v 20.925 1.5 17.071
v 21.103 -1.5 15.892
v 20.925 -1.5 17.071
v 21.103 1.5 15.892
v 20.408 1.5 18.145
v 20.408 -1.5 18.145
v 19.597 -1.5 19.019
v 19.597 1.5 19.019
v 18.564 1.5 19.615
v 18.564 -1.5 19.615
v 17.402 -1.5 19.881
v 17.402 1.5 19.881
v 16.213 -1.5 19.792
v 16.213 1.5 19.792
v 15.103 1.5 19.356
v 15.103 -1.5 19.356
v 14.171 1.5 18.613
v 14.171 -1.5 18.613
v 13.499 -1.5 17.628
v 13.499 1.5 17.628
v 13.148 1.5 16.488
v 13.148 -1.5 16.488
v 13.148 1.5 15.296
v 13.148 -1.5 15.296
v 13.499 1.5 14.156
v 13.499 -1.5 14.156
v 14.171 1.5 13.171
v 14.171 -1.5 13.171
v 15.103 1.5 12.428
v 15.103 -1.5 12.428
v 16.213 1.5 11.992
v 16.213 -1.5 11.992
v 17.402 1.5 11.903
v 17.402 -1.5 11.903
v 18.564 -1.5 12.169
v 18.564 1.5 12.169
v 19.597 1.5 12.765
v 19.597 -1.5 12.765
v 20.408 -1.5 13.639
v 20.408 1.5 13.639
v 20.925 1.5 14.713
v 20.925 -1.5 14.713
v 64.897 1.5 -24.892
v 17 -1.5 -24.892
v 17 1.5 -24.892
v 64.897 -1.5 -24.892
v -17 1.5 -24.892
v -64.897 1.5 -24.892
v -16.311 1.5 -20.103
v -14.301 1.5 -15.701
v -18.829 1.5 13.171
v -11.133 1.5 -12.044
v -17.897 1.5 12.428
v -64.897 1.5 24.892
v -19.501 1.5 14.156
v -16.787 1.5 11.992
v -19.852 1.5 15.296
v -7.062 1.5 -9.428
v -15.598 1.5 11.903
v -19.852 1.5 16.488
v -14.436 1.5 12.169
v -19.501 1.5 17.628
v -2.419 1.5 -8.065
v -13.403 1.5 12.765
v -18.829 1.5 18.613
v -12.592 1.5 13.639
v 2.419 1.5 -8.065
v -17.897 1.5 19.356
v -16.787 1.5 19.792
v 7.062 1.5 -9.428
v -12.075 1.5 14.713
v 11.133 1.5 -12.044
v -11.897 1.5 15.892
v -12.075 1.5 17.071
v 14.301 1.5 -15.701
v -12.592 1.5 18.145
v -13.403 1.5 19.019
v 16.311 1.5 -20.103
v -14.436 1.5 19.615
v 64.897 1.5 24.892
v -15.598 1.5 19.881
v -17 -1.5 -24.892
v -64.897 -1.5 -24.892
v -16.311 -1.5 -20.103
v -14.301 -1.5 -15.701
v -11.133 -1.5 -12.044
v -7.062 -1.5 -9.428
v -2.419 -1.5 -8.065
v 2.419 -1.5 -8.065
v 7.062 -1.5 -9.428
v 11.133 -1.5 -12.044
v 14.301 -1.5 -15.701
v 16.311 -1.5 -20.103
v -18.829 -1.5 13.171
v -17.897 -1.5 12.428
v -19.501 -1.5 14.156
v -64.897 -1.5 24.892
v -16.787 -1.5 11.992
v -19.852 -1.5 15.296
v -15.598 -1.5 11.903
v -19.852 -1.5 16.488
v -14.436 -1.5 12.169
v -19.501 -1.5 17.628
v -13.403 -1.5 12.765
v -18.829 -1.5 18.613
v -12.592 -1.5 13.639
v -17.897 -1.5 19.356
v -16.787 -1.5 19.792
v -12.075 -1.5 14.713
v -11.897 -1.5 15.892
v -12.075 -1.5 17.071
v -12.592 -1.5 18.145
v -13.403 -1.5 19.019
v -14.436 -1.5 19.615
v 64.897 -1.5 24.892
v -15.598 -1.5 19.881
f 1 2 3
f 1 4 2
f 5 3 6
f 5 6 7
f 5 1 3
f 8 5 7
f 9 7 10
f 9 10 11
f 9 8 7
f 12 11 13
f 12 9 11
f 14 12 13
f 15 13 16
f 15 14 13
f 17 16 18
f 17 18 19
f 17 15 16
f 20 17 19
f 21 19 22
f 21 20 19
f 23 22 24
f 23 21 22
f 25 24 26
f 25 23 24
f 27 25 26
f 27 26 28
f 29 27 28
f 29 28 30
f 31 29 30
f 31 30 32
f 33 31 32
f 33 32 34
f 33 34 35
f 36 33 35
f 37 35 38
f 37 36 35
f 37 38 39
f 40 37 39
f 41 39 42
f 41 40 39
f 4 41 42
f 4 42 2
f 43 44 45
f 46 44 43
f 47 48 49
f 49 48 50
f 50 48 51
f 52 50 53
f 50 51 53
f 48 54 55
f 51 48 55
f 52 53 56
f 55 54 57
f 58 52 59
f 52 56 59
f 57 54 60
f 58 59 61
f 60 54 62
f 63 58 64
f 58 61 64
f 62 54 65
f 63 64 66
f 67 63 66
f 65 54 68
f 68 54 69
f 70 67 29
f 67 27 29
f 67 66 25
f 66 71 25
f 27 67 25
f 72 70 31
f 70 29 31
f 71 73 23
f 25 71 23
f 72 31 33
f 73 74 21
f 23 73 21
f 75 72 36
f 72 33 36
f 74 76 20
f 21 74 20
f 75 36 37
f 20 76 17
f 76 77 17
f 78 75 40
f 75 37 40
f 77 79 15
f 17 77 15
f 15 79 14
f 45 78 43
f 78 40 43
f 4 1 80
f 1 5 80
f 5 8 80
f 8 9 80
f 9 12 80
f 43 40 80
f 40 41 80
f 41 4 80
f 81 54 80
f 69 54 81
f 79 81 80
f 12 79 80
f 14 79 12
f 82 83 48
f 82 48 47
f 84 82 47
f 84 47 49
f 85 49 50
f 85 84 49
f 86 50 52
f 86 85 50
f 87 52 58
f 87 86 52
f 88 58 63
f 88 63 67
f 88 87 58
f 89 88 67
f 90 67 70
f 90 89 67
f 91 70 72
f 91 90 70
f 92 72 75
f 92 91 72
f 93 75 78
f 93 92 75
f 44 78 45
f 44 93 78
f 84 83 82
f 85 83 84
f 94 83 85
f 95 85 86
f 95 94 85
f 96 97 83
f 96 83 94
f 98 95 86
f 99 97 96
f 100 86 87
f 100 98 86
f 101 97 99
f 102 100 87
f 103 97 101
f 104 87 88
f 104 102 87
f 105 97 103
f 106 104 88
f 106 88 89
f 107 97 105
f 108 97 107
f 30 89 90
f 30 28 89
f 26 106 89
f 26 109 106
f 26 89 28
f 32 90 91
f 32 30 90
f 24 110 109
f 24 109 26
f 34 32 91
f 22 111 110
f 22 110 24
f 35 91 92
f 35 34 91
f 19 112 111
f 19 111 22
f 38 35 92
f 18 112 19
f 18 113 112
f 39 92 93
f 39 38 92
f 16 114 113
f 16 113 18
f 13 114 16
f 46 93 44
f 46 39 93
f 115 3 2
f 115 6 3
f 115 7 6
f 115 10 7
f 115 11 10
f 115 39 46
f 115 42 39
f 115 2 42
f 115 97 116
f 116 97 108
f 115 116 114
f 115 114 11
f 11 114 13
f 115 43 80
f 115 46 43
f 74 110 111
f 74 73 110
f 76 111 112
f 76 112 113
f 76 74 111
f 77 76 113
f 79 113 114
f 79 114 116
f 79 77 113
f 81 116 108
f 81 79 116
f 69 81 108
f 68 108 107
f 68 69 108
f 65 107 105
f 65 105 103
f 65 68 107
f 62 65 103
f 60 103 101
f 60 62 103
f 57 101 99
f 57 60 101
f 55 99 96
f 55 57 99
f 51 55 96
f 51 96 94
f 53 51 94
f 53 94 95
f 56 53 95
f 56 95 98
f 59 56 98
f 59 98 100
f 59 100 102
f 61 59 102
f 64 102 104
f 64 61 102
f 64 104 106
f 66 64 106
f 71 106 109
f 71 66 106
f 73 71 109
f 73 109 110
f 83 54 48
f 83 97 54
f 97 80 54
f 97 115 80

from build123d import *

# Parameters (mm, degrees)
F0_R     = 4
F1_DEPTH = 1.5


with BuildPart() as f1:
    # F0 (on Front) → F1 (new body, symmetric)
    with BuildSketch(Plane.XZ):
        with BuildLine():
            Line((-64.897, 24.892), (-64.897, -24.892))
            Line((-64.897, -24.892), (-17, -24.892))
            ThreePointArc((-17, -24.892), (0, -7.892), (17, -24.892))
            Line((17, -24.892), (64.897, -24.892))
            Line((64.897, -24.892), (64.897, 24.892))
            Line((64.897, 24.892), (-64.897, 24.892))
        make_face()
        with Locations((-15.897, 15.892)):
            Circle(F0_R, mode=Mode.SUBTRACT)
        with Locations((17.103, 15.892)):
            Circle(F0_R, mode=Mode.SUBTRACT)
    extrude(amount=F1_DEPTH, both=True)


solid = f1.part
